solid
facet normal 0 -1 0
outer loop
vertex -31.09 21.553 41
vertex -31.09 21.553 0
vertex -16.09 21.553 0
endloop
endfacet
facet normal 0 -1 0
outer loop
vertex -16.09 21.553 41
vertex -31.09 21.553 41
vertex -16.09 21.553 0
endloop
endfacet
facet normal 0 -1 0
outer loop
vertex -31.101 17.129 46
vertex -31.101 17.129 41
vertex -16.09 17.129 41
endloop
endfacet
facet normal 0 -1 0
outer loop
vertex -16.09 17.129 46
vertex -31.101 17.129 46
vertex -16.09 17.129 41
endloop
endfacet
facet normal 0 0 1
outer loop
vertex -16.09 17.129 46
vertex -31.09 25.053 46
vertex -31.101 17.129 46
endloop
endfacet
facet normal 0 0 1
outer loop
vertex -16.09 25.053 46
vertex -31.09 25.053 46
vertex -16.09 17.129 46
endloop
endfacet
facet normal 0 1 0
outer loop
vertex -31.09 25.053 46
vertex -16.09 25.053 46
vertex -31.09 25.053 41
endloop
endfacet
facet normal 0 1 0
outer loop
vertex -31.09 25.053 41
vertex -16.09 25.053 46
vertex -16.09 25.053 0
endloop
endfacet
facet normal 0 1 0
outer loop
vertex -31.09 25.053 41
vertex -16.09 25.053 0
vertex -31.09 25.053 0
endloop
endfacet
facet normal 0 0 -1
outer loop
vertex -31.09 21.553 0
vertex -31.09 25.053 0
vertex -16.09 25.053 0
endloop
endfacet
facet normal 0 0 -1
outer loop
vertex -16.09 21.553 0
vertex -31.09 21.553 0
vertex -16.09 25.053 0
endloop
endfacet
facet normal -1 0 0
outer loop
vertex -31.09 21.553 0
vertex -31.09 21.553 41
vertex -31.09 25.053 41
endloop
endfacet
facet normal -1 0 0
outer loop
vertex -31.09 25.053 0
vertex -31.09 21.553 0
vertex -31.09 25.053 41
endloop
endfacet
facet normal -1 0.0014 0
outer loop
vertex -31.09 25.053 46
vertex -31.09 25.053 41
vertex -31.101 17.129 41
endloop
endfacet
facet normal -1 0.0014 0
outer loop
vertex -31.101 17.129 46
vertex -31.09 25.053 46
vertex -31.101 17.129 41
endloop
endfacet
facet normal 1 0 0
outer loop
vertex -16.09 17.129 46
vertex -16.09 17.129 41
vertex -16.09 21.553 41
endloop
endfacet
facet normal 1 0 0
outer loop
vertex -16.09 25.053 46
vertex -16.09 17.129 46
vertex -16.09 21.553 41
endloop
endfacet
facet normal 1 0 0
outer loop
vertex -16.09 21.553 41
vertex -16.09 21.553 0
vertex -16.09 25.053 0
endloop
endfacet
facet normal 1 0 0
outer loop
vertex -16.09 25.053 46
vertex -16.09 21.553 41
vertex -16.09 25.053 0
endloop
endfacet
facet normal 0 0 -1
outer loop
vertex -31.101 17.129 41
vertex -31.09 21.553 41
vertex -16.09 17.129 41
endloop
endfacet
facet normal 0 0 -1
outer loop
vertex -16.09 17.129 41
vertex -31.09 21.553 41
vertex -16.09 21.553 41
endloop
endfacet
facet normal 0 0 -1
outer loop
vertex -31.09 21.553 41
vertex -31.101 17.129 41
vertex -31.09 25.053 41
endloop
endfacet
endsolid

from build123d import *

# Parameters (mm, degrees)
CROQUIS1_W              = 15
CROQUIS1_H              = 3.5
SALIENTE_EXTRUIR1_DEPTH = 41
SALIENTE_EXTRUIR3_DEPTH = 5


with BuildPart() as part:
    # Croquis1 → Saliente-Extruir1 (new body)
    with BuildSketch(Plane.XY):
        with Locations((-23.589562337, 23.303225109)):
            Rectangle(CROQUIS1_W, CROQUIS1_H)
    extrude(amount=SALIENTE_EXTRUIR1_DEPTH)

    # Croquis2 → Saliente-Extruir3 (add)
    with BuildSketch(Plane.XY.offset(41)):
        Polygon((-31.089562337, 25.053225109), (-31.101471771, 17.12903643), (-16.089562337, 17.12903643), (-16.089562337, 25.053225109), align=None)
    extrude(amount=SALIENTE_EXTRUIR3_DEPTH)


solid = part.part
